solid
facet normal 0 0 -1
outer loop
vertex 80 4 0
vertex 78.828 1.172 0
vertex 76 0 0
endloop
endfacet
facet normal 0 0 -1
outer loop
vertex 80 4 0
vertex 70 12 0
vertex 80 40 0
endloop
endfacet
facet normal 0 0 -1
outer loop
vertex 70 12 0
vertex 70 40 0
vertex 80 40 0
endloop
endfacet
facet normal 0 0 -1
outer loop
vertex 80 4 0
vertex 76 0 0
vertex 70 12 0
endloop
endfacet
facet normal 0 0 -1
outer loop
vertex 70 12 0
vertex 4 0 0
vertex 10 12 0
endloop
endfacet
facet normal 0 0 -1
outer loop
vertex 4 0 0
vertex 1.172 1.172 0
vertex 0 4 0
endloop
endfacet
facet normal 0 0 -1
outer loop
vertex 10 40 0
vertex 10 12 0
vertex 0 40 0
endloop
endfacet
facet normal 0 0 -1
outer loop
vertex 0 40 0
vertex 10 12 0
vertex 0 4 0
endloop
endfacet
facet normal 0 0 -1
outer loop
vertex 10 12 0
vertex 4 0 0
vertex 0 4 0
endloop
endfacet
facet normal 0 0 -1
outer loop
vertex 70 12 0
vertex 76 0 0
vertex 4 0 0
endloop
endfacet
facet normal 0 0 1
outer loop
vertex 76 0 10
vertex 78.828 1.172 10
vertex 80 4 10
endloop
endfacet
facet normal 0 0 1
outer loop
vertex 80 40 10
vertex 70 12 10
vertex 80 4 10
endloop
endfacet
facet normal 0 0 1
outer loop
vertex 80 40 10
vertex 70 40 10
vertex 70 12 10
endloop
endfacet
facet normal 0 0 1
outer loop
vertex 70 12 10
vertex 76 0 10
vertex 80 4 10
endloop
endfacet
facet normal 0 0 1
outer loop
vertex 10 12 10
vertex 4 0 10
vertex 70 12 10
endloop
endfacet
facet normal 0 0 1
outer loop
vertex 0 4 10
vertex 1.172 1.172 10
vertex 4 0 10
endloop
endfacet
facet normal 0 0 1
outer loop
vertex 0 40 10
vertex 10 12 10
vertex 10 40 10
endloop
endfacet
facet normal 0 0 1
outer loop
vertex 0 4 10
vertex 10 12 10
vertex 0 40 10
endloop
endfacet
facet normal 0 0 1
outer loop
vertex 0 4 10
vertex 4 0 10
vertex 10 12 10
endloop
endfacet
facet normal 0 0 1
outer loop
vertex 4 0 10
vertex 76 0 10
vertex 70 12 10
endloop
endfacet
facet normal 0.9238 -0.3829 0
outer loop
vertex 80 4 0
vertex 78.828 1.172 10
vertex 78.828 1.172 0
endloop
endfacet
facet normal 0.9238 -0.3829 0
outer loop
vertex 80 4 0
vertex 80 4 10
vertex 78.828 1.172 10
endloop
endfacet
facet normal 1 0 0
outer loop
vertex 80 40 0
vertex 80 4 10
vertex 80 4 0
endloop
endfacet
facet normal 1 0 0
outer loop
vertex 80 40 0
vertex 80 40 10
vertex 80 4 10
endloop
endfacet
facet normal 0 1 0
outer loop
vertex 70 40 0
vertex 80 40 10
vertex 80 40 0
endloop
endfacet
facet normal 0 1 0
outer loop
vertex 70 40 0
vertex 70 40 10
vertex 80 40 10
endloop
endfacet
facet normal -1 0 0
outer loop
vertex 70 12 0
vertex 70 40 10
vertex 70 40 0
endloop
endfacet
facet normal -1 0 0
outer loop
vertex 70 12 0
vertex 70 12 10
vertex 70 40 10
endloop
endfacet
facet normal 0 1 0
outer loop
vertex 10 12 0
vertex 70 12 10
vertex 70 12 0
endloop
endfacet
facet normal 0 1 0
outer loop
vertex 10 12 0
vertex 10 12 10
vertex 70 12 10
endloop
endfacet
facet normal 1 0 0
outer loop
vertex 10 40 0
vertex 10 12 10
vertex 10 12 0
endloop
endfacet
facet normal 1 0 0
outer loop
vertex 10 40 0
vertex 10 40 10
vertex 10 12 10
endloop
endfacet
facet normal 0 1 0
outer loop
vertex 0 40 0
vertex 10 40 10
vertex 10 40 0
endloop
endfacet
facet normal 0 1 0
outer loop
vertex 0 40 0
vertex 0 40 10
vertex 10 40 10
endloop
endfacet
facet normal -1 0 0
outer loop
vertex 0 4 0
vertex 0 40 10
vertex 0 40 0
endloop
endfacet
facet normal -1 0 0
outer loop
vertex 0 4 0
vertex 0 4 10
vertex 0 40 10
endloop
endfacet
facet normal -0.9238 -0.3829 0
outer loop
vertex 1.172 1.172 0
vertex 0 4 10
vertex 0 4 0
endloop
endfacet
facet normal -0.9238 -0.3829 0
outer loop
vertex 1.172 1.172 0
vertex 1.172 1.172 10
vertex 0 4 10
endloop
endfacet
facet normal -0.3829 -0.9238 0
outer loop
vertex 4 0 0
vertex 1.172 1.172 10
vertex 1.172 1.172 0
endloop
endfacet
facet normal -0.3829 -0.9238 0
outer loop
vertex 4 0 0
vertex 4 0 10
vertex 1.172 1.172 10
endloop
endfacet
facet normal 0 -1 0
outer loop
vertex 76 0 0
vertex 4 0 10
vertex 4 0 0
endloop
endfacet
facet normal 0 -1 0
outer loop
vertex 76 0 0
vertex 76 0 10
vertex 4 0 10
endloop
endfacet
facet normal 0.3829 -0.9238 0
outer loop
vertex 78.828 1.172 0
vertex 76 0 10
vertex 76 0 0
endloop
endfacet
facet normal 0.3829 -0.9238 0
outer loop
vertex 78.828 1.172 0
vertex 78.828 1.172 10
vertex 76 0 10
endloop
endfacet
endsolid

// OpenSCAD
$fn = 32;

// ----------------------------------------------------------------------
// Heat sink frame: 80 x 40 mm frame, 10 mm walls
// ----------------------------------------------------------------------

// --- parameters (mm) ---
profile_height = 10;      // extrusion height
profile_points = 12;      // points of the closed outline

profile = [[0, 4], [1.172, 1.172], [4, 0], [76, 0], [78.828, 1.172], [80, 4], [80, 40], [70, 40], [70, 12], [10, 12], [10, 40], [0, 40]];  // single closed polygon, 12 points, counter clockwise

// --- the one profile operation ---
linear_extrude(height = profile_height) polygon(points = profile);
